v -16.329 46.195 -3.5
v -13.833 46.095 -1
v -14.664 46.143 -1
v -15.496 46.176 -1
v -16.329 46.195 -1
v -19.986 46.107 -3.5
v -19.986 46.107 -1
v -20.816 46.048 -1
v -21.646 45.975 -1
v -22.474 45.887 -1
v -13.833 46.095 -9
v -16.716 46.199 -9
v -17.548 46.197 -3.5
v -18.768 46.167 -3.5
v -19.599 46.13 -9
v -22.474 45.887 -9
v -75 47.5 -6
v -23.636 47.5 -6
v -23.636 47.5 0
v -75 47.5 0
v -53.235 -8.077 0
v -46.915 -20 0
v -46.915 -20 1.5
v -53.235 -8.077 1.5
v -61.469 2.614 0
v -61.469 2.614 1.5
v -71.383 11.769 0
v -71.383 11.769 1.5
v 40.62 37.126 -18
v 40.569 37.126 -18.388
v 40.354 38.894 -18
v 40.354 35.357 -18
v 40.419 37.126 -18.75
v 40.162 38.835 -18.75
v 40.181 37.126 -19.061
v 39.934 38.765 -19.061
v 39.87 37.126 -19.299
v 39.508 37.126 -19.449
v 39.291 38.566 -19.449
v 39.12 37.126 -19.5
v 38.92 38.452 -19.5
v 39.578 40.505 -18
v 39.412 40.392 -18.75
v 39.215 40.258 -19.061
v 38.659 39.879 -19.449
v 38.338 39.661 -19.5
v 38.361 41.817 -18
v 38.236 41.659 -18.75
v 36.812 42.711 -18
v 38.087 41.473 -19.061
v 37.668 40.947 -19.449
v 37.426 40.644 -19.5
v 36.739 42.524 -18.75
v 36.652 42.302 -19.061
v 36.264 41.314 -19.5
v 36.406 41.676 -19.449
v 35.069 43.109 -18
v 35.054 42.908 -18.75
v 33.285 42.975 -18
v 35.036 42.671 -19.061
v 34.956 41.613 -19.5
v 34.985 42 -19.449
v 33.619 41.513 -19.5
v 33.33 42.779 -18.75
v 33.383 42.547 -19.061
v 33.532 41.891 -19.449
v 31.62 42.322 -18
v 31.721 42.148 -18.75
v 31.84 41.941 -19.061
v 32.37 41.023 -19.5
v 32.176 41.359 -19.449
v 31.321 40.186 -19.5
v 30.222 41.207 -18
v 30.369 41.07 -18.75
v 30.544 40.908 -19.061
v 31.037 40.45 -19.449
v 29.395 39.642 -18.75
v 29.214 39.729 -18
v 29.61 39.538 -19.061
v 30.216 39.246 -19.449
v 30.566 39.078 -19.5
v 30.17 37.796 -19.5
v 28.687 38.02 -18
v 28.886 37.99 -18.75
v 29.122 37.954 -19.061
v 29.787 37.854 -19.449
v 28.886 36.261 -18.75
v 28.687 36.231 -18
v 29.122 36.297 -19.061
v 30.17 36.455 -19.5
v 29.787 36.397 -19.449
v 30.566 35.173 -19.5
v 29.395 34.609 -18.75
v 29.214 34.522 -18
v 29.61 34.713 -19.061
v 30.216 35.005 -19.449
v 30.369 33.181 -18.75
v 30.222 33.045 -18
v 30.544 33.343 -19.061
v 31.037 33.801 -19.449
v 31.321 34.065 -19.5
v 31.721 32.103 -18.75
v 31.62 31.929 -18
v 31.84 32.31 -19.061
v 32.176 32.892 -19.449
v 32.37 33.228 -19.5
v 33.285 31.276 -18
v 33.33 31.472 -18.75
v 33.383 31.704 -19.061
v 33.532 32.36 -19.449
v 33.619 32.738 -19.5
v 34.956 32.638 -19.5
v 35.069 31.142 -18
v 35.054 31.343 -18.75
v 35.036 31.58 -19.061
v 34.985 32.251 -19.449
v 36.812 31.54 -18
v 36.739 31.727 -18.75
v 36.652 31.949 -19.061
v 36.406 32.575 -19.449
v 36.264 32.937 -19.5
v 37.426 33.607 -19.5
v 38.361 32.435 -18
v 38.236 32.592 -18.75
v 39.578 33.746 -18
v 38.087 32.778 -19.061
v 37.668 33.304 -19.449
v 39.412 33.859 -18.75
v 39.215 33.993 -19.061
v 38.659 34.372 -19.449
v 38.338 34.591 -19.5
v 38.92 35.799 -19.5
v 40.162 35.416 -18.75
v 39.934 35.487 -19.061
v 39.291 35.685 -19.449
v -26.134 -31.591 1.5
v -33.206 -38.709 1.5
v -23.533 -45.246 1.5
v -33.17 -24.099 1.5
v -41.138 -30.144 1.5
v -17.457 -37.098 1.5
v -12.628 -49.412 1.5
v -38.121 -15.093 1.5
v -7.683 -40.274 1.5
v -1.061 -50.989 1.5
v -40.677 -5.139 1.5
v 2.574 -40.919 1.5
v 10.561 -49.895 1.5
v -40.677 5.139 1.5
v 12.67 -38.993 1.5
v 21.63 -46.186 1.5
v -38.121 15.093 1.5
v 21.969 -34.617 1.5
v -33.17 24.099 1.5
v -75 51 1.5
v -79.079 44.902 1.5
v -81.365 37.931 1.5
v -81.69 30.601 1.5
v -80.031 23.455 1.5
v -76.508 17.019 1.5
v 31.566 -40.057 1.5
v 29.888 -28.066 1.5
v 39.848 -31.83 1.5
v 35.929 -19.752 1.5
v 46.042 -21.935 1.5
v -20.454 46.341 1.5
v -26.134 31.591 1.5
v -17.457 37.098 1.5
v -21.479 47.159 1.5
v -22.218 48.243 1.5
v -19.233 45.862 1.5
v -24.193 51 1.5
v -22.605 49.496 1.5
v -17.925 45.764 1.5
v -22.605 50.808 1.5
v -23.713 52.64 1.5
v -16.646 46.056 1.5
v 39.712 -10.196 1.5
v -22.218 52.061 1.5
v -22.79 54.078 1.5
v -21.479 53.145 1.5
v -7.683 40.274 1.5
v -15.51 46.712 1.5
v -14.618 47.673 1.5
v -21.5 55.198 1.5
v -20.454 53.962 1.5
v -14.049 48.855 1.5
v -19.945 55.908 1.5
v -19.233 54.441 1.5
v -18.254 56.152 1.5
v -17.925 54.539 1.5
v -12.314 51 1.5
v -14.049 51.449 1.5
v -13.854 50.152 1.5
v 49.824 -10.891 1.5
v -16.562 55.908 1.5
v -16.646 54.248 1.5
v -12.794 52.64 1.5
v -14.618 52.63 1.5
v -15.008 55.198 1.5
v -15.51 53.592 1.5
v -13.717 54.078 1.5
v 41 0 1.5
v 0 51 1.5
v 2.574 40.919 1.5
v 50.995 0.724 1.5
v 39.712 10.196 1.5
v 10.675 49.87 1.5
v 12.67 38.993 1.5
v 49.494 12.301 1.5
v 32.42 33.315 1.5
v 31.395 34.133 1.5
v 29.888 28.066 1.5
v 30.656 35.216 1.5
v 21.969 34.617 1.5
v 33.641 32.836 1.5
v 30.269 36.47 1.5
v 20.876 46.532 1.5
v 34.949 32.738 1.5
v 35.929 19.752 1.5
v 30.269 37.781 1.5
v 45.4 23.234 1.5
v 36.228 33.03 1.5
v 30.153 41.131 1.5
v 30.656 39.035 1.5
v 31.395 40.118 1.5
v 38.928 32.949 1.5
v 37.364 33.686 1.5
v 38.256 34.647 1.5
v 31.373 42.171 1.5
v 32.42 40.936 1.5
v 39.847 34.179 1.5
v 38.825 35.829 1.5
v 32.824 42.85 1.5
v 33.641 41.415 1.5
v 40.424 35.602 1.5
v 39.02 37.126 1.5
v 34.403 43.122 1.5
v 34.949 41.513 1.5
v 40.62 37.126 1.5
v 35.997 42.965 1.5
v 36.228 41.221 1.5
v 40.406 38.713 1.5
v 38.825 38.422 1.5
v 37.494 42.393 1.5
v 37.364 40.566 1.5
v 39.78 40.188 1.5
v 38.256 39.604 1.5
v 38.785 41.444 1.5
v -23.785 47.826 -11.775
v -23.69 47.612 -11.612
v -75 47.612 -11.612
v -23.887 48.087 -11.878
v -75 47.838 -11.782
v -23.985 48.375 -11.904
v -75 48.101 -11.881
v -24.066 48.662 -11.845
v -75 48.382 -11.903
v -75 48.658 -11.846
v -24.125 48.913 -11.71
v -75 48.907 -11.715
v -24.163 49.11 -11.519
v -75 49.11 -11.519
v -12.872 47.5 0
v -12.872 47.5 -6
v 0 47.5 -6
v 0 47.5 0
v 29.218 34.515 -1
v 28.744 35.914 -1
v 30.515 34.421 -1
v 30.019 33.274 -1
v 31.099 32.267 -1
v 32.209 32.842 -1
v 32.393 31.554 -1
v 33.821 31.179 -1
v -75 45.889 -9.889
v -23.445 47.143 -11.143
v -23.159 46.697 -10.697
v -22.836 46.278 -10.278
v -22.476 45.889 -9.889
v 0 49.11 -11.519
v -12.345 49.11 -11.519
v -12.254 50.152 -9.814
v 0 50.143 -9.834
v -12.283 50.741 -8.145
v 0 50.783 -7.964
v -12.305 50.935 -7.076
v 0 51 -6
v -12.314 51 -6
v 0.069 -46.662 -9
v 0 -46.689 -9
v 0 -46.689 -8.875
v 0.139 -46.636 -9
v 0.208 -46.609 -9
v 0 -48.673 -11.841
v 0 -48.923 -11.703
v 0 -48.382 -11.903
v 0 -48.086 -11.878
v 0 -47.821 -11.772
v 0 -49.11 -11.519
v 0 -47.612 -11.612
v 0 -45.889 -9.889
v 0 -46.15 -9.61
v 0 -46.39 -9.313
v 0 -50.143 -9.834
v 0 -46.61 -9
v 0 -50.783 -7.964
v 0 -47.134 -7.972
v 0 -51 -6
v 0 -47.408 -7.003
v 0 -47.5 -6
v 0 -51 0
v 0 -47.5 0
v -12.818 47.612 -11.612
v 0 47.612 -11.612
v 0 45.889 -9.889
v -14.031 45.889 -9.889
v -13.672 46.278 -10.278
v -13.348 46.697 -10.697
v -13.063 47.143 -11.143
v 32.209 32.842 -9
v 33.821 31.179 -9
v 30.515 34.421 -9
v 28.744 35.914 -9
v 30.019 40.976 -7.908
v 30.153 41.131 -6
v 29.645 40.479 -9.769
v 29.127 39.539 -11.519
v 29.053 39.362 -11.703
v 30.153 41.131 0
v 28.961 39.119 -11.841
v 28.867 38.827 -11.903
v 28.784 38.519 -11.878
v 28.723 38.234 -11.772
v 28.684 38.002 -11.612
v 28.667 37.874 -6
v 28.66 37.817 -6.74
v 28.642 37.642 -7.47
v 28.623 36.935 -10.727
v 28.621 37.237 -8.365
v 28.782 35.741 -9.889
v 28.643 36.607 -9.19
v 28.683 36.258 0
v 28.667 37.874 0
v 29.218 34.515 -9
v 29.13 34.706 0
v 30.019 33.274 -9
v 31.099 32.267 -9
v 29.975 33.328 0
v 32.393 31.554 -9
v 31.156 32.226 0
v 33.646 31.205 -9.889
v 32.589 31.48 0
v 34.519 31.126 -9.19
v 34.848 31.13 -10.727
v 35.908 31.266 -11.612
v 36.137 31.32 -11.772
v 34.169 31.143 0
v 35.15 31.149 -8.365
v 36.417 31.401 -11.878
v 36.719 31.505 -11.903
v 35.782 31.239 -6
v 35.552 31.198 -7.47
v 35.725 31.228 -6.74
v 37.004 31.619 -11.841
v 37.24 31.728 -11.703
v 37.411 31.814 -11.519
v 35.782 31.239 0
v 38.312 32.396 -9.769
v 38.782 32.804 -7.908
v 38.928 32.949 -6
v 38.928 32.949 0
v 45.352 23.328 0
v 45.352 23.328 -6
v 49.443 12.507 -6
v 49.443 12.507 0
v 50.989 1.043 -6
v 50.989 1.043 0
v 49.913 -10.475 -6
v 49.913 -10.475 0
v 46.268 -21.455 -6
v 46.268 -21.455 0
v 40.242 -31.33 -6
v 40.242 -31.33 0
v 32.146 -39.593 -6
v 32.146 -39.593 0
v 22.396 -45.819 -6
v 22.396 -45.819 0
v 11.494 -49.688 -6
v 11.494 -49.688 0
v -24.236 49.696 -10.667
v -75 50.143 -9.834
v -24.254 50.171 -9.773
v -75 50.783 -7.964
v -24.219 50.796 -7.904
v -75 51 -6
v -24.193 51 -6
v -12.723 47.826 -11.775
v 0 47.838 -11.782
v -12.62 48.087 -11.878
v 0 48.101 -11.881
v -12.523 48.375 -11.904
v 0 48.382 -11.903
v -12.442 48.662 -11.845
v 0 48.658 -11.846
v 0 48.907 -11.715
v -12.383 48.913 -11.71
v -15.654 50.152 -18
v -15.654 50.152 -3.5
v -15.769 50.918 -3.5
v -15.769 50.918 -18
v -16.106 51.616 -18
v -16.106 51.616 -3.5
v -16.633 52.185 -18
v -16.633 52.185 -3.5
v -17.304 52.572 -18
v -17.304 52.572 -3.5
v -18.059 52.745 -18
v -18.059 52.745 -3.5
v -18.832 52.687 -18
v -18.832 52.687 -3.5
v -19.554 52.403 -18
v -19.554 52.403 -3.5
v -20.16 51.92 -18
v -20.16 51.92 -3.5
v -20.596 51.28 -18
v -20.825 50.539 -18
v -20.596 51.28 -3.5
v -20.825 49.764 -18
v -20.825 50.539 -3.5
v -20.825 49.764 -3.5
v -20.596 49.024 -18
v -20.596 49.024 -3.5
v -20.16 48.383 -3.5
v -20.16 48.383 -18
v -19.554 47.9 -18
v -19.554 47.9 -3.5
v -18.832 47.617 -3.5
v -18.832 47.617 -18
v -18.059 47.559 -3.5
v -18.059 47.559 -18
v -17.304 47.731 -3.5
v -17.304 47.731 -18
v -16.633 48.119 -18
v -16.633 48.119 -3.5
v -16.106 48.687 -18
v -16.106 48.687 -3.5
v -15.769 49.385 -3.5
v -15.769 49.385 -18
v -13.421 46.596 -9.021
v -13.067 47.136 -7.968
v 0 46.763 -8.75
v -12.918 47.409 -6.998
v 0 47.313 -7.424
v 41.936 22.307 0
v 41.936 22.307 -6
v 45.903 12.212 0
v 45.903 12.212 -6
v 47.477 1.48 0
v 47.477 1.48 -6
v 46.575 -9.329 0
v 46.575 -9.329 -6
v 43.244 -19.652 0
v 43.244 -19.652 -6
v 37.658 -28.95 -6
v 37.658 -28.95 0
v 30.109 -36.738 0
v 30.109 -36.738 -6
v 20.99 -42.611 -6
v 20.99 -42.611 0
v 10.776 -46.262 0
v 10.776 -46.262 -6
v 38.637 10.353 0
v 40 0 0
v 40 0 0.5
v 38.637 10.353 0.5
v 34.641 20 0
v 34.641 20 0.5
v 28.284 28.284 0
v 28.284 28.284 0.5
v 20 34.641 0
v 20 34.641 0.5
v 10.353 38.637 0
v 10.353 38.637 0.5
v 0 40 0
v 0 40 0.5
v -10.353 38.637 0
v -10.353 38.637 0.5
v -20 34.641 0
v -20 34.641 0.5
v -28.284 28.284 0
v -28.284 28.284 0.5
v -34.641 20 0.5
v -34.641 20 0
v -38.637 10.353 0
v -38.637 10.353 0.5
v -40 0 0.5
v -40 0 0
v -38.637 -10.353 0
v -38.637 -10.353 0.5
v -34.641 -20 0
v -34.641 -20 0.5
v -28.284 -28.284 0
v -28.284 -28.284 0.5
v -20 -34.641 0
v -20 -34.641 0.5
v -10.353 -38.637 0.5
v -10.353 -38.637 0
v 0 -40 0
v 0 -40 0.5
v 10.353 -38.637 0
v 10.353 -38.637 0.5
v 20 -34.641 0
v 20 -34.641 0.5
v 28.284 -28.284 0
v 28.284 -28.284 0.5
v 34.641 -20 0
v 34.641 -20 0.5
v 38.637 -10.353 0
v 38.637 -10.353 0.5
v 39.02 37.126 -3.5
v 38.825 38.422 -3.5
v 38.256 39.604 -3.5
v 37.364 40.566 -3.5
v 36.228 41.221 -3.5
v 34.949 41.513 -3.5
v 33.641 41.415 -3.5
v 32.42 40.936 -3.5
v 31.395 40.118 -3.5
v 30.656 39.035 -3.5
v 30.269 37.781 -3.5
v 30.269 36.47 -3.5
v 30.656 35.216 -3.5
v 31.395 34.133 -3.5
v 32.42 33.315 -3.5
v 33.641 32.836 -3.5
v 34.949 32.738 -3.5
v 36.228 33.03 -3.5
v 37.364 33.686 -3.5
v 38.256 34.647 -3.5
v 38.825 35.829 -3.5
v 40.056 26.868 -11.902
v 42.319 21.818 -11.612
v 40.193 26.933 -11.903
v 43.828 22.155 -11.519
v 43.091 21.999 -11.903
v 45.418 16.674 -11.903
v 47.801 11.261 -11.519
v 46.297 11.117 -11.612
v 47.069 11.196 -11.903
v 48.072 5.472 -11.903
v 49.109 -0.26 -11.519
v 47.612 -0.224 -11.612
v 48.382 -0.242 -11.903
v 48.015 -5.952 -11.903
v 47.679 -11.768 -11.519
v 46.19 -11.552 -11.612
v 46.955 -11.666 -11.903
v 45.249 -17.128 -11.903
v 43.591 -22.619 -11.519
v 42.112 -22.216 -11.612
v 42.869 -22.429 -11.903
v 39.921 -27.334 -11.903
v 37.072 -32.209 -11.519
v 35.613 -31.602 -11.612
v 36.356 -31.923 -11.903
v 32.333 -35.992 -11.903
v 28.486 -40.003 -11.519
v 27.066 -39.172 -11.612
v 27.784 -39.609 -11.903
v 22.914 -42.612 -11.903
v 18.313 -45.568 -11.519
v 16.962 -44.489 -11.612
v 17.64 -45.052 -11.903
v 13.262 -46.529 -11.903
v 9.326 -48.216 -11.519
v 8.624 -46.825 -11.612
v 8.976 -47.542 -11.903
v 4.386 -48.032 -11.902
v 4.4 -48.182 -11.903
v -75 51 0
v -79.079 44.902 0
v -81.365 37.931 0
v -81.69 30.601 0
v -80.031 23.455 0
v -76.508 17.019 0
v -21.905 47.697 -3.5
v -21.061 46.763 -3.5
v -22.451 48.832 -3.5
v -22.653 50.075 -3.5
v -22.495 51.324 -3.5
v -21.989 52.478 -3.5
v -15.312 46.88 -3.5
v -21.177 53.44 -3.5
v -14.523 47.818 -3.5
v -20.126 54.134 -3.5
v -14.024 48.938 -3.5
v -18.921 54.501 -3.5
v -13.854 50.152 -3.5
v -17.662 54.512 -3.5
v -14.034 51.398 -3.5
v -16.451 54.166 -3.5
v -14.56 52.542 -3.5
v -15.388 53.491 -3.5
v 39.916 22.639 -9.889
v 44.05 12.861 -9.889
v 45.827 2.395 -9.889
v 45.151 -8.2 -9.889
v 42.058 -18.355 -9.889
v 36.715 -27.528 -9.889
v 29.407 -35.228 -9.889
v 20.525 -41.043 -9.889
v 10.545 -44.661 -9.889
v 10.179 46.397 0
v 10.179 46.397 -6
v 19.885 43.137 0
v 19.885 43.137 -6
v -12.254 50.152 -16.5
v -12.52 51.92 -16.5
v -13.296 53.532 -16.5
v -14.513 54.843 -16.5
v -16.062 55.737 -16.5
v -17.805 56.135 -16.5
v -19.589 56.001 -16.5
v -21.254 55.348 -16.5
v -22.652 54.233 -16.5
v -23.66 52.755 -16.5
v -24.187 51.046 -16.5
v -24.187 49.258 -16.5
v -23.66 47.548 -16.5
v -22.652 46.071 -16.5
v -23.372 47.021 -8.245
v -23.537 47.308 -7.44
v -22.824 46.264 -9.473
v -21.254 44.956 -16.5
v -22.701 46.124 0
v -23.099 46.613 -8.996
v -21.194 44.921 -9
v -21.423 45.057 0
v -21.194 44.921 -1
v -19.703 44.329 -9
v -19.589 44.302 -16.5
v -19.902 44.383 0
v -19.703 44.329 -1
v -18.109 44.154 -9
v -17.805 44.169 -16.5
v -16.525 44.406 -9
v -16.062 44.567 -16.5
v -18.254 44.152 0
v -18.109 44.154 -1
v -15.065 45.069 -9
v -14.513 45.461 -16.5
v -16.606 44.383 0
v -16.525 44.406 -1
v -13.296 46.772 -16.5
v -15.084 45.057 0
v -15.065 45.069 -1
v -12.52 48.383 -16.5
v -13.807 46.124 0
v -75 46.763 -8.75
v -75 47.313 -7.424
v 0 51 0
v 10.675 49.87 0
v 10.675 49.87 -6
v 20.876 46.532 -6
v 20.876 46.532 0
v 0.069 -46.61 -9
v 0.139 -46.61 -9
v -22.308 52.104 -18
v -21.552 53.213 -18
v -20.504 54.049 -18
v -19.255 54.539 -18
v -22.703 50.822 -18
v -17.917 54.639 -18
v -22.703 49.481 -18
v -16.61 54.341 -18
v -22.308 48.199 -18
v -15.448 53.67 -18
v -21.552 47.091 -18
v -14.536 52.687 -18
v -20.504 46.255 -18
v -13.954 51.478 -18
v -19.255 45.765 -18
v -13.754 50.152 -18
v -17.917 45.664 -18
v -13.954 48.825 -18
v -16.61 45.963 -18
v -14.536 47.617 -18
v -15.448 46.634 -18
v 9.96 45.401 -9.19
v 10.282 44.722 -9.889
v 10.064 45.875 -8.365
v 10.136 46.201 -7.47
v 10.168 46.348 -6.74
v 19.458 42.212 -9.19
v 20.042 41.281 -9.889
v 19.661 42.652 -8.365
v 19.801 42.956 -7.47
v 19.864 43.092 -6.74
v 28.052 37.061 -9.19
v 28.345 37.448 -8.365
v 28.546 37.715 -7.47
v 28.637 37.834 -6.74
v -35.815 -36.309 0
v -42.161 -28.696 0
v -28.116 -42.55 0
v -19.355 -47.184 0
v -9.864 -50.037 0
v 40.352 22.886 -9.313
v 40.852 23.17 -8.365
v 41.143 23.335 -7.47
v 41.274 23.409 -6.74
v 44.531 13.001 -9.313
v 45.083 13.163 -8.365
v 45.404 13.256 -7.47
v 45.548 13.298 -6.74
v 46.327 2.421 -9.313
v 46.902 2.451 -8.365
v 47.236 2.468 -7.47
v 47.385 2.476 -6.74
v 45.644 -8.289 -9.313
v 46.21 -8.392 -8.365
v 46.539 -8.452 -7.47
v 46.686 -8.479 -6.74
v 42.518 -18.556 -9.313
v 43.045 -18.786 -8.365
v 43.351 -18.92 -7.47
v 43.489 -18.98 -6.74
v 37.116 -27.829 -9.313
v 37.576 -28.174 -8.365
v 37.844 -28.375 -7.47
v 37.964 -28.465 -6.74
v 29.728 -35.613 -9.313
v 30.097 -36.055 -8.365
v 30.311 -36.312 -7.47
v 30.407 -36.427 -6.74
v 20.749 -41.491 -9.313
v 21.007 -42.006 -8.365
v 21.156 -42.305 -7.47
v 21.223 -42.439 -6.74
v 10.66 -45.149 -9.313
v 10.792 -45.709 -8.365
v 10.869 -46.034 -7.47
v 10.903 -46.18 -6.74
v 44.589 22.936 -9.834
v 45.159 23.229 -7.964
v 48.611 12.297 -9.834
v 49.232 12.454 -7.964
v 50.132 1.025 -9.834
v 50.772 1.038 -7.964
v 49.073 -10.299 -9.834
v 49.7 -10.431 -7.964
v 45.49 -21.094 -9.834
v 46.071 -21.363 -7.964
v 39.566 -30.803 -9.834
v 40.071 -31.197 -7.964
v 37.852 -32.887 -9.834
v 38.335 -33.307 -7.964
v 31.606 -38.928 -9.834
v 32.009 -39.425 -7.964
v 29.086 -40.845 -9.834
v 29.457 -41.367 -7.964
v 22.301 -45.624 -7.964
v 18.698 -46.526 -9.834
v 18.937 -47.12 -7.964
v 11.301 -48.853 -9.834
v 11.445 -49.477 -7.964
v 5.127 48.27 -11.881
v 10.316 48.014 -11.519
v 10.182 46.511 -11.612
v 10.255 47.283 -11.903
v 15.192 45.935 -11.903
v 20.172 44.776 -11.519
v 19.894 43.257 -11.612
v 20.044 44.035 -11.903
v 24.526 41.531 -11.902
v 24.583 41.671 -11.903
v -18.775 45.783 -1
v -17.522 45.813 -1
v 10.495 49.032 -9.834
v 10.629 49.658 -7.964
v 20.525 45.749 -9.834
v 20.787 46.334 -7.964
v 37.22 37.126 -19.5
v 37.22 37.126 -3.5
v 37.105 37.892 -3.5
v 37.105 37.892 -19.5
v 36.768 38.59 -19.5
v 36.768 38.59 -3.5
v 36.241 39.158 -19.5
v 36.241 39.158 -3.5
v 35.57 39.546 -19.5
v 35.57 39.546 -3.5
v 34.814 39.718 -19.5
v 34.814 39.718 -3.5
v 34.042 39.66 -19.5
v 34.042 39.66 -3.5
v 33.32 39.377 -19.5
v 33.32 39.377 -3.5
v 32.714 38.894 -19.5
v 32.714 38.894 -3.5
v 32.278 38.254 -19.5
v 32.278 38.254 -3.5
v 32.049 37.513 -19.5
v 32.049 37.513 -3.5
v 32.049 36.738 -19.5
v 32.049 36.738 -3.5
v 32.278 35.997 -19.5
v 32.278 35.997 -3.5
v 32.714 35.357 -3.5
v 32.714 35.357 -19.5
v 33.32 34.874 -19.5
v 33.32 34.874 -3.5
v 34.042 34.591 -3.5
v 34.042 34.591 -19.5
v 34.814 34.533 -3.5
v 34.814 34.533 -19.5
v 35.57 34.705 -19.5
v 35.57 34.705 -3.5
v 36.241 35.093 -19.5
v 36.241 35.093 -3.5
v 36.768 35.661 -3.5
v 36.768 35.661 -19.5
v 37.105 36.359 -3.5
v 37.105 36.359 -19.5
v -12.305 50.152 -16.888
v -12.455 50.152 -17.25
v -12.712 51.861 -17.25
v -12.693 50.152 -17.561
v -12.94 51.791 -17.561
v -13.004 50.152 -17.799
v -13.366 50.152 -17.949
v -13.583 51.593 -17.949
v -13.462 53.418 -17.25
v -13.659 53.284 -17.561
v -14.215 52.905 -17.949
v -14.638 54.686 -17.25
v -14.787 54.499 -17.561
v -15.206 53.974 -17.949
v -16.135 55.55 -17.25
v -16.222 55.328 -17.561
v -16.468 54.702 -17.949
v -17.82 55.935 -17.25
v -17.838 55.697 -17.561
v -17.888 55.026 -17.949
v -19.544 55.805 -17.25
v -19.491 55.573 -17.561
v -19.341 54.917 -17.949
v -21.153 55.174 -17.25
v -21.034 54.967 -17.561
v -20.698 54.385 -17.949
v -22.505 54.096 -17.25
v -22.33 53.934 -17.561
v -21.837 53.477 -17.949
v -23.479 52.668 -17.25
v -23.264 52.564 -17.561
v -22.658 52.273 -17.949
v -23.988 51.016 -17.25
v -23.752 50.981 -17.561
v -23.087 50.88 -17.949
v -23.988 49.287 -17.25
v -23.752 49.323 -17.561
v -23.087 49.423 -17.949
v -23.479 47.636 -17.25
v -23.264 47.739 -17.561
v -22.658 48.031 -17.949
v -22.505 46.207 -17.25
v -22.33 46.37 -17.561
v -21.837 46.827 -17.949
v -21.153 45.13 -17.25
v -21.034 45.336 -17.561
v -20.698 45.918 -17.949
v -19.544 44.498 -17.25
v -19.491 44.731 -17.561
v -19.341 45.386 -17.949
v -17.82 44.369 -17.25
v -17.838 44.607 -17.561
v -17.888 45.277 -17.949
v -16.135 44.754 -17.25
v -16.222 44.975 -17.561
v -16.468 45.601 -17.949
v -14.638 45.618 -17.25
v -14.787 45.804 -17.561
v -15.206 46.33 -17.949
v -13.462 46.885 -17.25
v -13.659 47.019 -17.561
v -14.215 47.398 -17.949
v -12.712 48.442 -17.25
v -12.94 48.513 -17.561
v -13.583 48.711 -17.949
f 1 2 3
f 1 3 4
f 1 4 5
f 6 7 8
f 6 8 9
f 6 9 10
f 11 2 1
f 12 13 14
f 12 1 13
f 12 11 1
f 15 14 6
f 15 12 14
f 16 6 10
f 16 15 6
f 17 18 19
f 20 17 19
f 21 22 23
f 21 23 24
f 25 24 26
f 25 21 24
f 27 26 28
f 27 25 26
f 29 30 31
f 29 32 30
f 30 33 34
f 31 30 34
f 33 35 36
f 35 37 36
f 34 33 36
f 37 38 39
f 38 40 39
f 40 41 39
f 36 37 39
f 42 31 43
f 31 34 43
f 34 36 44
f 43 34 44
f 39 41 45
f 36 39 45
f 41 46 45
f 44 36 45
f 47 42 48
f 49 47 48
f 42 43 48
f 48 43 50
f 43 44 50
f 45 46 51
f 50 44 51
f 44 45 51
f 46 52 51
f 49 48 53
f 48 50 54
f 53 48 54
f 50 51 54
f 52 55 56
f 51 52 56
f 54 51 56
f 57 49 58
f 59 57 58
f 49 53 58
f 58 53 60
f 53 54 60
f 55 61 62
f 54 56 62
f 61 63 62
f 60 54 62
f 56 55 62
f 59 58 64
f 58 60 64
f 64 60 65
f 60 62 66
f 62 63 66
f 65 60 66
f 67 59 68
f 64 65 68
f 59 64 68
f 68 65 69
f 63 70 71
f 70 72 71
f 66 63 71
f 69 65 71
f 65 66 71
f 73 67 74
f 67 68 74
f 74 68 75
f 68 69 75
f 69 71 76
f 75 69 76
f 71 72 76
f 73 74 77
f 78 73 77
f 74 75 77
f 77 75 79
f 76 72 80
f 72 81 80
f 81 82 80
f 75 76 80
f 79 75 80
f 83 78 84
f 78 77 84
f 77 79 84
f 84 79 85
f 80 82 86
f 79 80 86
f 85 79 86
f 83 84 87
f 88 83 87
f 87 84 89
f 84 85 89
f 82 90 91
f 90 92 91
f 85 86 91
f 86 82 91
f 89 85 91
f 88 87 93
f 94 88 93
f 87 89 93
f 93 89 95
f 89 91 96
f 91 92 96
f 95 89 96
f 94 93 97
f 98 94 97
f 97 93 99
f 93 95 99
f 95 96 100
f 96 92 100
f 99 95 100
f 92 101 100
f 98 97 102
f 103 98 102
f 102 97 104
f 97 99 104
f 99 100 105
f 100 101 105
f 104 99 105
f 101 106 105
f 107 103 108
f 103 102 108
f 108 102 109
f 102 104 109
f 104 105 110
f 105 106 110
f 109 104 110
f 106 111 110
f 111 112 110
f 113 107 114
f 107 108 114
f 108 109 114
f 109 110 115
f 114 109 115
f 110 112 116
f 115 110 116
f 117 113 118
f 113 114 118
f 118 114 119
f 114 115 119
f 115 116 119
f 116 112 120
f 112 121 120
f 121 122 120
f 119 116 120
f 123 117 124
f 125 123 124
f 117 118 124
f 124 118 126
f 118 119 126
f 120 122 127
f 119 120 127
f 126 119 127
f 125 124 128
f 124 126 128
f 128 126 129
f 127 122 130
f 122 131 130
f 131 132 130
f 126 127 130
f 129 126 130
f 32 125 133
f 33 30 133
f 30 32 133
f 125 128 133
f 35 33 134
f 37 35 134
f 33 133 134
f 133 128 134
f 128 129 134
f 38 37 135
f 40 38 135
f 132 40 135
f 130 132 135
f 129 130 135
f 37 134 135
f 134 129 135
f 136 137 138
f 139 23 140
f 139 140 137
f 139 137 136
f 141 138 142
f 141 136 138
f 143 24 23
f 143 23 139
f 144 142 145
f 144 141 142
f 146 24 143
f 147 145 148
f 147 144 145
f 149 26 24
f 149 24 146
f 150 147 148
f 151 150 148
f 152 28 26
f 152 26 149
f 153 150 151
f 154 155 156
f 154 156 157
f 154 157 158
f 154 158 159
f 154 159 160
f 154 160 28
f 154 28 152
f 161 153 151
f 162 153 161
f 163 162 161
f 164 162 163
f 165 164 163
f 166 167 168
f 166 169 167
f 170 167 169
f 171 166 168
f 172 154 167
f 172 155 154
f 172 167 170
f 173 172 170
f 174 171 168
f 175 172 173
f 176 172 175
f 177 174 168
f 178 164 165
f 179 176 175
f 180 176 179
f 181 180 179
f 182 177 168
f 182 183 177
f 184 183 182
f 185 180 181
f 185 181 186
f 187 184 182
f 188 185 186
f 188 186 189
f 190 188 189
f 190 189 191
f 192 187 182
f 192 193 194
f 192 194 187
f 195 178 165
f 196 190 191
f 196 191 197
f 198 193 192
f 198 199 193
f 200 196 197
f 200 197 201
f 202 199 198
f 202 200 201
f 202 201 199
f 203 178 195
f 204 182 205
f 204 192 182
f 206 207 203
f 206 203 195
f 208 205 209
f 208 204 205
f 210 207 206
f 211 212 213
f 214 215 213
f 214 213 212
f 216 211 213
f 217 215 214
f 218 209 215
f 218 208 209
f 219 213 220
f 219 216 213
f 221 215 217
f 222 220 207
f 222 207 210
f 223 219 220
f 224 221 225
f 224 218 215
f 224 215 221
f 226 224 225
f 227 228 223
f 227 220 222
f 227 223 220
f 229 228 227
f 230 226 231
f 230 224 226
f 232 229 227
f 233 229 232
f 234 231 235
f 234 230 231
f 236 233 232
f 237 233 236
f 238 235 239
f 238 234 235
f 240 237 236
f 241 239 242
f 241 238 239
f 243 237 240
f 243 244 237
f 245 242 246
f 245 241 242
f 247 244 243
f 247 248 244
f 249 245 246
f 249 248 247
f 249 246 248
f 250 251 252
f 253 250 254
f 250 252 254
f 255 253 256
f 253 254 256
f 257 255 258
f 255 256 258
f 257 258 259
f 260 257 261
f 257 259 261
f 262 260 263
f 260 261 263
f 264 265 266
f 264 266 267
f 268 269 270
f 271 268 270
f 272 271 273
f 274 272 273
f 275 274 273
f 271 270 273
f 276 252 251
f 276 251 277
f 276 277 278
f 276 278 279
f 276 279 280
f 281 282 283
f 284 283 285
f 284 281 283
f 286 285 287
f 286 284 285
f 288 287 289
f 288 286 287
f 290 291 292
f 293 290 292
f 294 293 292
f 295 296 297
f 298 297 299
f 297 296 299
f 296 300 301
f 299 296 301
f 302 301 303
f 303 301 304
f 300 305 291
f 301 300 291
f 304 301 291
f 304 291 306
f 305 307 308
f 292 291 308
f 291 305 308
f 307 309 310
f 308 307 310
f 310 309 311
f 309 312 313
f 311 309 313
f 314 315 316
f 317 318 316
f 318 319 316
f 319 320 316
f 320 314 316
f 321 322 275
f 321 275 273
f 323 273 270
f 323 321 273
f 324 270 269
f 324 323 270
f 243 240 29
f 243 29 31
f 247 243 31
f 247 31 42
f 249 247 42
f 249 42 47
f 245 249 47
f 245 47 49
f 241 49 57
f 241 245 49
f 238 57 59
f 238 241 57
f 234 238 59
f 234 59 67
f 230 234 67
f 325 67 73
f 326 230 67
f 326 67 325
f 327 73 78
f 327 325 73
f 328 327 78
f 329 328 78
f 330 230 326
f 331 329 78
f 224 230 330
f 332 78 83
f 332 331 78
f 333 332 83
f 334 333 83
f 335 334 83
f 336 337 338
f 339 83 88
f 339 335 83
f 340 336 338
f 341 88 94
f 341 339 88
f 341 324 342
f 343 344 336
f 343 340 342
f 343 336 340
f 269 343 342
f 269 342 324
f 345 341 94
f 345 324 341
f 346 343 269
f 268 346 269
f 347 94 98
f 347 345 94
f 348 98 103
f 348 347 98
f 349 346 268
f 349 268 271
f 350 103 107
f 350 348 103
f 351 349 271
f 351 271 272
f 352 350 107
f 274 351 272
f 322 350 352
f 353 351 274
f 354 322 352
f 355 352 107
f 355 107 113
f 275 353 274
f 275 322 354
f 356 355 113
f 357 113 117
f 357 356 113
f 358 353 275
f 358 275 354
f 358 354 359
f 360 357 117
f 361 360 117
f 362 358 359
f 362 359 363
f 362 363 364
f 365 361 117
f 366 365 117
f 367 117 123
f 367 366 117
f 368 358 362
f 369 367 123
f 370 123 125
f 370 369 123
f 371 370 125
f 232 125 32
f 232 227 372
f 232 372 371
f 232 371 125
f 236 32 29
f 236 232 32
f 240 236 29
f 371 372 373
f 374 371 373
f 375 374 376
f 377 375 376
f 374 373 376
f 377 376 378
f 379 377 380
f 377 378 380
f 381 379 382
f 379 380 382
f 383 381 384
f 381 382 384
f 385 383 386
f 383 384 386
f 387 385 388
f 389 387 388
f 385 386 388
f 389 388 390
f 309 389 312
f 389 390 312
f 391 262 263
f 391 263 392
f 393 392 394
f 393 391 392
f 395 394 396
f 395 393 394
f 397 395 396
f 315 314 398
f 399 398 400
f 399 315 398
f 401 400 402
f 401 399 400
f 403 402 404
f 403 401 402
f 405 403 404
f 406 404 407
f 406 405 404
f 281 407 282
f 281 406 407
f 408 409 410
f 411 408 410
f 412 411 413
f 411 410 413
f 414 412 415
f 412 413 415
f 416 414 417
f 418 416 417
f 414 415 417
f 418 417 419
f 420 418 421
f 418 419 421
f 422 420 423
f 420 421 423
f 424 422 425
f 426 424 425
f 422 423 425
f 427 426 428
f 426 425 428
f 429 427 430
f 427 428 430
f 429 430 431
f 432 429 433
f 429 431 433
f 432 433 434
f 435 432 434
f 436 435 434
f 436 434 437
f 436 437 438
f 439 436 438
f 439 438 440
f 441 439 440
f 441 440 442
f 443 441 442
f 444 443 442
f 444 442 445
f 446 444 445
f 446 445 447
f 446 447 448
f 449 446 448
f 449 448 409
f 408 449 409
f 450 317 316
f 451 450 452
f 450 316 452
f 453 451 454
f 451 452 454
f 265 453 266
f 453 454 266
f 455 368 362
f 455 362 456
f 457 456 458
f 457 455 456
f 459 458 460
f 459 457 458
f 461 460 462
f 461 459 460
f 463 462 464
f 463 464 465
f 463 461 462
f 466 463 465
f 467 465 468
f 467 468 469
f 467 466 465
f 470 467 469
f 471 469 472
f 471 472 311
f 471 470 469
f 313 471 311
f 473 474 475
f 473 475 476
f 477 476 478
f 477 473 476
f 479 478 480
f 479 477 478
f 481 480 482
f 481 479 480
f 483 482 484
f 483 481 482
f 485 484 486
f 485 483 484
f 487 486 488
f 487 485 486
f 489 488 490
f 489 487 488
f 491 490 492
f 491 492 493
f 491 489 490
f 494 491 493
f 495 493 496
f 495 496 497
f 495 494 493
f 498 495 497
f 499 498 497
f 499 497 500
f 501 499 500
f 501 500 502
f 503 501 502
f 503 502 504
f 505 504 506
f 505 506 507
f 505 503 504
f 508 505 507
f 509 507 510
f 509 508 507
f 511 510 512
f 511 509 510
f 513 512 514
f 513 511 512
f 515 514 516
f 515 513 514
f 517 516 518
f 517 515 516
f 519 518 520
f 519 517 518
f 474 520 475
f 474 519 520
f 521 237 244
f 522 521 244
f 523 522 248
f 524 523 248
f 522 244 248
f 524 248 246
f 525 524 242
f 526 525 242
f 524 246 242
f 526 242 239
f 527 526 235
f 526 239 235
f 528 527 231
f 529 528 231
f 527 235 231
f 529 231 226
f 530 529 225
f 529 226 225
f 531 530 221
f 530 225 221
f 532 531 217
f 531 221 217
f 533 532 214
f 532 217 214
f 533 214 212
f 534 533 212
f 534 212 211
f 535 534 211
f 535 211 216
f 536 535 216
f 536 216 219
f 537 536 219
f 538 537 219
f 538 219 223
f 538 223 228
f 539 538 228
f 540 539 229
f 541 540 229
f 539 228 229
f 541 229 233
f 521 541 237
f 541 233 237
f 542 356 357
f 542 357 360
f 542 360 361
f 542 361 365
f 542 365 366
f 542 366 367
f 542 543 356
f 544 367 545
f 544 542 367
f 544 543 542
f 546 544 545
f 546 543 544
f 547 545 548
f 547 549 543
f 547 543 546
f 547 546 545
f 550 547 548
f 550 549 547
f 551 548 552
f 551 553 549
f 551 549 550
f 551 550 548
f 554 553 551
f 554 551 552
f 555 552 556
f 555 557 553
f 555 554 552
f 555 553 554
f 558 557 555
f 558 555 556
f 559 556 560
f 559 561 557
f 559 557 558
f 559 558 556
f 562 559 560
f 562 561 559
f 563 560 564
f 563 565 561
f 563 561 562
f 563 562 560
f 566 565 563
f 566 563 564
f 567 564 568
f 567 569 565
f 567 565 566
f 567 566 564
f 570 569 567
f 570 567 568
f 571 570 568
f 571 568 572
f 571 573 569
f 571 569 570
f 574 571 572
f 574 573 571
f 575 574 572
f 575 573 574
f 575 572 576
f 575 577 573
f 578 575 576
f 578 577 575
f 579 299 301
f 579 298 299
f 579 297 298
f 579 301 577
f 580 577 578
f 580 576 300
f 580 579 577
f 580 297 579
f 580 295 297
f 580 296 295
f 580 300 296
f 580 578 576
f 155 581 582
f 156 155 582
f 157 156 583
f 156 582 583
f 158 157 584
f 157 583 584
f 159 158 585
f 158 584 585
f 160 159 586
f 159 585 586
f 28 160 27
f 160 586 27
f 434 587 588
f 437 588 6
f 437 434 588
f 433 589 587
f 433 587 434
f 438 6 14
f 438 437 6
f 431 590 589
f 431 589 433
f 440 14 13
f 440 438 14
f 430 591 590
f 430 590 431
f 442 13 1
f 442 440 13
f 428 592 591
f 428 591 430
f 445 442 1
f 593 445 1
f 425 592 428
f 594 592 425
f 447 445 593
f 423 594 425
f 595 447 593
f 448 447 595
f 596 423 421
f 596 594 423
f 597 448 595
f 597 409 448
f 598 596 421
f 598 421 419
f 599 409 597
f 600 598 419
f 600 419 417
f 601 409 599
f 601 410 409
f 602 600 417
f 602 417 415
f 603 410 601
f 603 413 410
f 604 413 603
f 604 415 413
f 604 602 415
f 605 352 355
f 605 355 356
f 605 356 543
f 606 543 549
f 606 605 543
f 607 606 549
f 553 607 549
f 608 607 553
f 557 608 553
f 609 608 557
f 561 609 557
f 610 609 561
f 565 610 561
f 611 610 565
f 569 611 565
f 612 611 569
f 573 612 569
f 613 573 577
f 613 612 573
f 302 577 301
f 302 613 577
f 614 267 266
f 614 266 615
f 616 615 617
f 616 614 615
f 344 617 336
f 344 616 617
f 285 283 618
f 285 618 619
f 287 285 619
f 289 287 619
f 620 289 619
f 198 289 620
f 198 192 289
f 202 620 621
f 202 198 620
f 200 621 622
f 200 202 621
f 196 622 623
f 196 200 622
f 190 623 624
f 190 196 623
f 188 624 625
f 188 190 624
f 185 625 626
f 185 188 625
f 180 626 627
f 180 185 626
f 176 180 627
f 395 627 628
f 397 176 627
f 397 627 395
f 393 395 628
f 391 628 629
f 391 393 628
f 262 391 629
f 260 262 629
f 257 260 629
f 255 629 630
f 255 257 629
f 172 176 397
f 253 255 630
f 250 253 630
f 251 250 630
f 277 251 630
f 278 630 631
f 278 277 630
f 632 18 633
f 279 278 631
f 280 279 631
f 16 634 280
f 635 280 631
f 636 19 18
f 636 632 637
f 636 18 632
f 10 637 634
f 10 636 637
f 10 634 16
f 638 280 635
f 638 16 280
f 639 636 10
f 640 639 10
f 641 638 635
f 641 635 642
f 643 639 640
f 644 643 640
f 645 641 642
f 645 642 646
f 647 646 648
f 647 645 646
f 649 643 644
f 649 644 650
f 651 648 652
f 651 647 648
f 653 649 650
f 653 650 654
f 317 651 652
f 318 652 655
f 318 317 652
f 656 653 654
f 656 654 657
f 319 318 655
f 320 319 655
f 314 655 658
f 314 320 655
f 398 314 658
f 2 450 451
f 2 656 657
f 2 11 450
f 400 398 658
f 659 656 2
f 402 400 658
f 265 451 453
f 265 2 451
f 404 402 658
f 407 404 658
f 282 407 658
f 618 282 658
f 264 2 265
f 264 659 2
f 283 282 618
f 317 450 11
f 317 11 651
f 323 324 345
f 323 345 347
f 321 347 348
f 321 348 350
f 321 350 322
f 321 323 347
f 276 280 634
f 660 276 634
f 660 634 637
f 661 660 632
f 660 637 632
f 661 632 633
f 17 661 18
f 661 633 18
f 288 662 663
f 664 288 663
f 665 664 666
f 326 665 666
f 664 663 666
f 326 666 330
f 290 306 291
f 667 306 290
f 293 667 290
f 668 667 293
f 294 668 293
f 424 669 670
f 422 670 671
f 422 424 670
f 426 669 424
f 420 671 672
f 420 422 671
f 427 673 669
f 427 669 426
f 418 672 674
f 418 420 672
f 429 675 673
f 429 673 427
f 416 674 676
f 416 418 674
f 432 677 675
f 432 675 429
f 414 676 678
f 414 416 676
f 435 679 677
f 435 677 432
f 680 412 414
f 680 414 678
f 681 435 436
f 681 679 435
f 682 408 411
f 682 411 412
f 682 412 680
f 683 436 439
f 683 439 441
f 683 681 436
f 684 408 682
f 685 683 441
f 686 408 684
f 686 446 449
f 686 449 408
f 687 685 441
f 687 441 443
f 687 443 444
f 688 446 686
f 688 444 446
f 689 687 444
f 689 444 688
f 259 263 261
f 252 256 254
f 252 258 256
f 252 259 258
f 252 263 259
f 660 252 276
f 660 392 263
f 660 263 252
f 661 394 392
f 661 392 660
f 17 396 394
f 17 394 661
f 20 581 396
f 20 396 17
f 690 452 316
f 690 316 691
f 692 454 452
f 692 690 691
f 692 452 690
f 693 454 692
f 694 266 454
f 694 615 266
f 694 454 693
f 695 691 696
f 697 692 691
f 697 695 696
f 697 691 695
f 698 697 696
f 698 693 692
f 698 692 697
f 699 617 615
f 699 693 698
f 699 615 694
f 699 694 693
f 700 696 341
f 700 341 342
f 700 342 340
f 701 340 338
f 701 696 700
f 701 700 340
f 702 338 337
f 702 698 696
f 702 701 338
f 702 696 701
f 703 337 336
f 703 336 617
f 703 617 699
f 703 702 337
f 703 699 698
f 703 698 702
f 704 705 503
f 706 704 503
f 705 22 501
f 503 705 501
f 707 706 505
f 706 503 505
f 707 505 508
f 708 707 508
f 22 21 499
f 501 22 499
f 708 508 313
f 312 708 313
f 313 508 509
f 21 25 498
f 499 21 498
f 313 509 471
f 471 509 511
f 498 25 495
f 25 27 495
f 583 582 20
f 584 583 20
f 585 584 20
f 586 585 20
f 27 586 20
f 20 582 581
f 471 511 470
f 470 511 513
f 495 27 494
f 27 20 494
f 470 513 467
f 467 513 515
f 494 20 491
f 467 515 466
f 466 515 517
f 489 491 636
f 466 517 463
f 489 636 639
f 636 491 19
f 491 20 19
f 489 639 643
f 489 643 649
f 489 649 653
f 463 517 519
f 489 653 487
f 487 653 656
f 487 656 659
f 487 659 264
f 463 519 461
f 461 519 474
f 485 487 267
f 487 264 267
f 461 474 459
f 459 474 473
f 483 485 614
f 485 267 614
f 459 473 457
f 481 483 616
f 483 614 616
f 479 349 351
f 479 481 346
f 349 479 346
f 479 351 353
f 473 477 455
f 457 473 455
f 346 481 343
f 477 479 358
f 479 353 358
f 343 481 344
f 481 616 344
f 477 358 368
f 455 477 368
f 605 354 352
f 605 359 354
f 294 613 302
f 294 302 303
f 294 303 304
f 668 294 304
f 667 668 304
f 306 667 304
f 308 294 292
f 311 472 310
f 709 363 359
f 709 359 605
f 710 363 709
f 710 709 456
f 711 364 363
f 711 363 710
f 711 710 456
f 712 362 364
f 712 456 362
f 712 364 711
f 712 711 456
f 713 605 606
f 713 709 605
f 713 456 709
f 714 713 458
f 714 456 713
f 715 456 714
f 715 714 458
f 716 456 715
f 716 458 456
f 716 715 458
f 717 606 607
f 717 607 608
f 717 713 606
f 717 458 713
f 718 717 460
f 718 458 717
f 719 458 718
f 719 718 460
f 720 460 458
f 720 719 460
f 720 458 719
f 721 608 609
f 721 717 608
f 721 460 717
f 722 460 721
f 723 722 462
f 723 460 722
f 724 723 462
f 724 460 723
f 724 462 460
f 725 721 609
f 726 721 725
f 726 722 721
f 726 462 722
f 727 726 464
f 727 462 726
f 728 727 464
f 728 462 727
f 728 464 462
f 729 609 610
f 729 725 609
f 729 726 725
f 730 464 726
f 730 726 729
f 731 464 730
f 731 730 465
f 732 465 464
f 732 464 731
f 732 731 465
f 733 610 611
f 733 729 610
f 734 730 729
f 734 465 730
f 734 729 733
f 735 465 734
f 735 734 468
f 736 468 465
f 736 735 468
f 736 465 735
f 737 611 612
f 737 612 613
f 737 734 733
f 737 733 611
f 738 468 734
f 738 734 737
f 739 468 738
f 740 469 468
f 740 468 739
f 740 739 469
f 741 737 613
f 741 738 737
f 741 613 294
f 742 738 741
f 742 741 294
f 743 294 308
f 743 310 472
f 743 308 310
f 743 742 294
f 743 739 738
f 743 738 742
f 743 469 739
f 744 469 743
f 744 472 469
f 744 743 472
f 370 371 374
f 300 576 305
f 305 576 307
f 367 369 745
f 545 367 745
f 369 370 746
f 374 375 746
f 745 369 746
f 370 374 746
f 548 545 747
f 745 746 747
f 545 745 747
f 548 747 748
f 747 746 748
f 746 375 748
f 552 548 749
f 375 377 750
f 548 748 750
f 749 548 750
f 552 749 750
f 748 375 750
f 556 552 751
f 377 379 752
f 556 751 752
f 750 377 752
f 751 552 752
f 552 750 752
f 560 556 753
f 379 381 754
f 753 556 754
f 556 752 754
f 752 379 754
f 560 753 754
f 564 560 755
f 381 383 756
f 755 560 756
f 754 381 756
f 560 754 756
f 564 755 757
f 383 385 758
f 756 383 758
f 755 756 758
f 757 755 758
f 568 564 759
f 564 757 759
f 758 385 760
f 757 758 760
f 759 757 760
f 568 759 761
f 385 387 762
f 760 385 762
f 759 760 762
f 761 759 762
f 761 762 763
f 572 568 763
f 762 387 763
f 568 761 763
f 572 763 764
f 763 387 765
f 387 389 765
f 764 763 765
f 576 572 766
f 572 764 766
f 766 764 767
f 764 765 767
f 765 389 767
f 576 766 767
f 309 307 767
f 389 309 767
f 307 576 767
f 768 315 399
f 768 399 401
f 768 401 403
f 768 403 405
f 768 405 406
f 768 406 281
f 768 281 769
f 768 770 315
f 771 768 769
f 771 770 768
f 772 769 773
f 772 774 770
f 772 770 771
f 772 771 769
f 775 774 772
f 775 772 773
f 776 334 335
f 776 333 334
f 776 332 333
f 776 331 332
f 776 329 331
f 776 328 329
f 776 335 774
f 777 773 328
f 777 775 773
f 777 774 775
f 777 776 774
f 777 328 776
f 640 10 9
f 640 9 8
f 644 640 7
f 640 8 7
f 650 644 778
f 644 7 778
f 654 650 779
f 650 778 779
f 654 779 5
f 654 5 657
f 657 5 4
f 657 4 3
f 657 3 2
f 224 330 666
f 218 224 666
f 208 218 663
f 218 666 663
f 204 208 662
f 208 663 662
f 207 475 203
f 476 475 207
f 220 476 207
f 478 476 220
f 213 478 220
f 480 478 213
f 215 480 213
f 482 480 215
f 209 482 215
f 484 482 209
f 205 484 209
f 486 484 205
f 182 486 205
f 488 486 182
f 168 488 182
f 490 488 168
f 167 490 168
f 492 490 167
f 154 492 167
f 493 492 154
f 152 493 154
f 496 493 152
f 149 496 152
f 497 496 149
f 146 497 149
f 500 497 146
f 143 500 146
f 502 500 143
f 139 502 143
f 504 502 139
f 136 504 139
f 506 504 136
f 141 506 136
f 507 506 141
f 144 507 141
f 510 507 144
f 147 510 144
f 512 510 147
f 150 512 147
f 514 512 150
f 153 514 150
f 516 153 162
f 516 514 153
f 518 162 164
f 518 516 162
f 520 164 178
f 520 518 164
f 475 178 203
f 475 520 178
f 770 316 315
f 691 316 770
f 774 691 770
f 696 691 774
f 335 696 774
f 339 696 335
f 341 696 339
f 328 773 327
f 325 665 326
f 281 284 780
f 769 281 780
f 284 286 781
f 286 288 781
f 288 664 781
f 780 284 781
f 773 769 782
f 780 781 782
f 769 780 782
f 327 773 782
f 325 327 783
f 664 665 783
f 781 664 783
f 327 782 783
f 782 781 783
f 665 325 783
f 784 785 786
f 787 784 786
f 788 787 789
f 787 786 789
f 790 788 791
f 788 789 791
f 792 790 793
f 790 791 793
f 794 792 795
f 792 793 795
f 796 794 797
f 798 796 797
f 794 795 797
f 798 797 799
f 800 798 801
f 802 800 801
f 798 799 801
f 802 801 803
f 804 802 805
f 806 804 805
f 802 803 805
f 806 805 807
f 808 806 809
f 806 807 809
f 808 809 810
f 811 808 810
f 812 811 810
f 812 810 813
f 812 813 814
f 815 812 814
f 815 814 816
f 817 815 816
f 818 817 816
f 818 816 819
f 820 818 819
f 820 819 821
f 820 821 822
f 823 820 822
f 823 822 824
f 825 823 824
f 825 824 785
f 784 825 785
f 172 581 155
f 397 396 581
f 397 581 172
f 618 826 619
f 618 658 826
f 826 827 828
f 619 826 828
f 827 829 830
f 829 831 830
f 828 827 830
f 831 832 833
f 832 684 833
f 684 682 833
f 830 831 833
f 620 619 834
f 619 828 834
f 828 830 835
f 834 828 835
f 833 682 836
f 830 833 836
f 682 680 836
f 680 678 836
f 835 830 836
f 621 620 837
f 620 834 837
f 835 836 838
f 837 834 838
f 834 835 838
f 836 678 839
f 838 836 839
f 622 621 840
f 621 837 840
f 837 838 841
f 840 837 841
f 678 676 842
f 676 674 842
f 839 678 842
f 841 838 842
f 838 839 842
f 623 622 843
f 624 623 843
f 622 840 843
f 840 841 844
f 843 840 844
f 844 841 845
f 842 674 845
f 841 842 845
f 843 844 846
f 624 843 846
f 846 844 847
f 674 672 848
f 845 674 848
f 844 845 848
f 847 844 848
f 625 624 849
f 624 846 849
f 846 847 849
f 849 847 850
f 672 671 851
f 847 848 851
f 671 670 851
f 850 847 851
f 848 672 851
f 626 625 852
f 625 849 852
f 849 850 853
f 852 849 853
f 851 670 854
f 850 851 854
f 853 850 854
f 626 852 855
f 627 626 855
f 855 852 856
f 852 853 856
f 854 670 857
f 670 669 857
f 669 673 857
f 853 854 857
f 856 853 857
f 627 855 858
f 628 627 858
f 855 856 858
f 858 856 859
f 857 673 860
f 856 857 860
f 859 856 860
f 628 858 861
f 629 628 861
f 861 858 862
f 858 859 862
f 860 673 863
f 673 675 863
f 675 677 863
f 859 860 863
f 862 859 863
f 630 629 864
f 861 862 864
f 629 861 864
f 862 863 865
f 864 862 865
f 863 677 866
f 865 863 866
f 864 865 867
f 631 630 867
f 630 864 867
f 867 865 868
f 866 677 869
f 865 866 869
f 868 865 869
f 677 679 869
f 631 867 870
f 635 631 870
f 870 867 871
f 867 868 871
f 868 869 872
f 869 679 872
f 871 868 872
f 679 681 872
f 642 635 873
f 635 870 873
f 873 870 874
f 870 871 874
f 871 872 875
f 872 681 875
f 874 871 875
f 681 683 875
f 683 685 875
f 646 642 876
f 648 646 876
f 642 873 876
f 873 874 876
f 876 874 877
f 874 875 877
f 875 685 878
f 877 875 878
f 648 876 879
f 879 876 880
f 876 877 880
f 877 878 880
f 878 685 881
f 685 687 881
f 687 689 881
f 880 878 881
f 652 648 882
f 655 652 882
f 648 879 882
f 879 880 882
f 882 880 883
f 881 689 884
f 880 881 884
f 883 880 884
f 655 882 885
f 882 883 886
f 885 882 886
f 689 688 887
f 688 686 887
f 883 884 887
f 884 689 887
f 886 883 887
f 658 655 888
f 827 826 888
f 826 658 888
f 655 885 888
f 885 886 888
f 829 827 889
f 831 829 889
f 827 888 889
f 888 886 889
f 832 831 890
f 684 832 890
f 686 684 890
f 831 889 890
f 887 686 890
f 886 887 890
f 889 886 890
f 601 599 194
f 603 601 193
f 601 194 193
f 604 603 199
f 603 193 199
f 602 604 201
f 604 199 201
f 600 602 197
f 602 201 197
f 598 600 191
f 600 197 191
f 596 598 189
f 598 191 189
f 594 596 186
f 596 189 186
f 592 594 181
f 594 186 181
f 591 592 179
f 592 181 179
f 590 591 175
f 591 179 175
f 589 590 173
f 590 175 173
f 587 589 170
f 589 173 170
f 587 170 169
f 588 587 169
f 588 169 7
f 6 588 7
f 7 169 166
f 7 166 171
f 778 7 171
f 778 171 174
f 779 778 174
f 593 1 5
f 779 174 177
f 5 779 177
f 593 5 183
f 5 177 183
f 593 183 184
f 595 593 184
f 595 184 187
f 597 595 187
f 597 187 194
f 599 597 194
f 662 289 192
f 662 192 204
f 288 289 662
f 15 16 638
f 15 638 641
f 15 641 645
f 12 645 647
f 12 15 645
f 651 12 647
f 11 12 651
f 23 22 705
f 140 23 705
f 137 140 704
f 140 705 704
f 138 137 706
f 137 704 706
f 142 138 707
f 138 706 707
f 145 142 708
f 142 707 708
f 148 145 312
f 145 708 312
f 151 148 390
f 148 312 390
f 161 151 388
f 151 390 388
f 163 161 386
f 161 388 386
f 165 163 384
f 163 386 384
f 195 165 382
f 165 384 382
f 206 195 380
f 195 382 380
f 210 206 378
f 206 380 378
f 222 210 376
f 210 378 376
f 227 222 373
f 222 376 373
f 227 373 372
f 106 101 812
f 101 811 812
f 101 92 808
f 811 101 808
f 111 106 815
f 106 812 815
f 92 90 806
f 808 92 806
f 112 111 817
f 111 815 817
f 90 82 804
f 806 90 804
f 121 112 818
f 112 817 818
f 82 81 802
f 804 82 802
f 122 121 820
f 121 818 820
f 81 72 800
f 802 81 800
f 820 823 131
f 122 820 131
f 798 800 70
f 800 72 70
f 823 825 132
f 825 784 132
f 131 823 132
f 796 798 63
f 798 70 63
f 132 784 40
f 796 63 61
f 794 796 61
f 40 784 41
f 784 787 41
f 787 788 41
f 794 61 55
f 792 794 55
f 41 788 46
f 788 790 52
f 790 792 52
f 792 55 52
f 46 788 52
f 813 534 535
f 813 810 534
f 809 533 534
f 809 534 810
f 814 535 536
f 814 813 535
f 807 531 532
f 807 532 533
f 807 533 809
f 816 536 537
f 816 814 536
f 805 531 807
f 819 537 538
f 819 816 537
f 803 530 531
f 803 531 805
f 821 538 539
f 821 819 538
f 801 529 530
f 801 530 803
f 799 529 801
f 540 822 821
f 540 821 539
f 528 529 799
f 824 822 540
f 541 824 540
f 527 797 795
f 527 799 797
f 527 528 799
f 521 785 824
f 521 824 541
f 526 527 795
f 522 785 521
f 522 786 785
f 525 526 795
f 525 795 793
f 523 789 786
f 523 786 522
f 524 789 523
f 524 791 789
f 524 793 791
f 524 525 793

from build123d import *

# Parameters (mm, degrees)
CYLINDER004_R     = 48
CYLINDER004_DEPTH = 8
CYLINDER_R        = 46
CYLINDER_DEPTH    = 8
REVOLUTION_ANGLE  = -180
SKETCH_R          = 40
PAD_DEPTH         = 1.5
PAD001_DEPTH      = 75
SKETCH005_R       = 6
PAD002_DEPTH      = 21
SKETCH012_R       = 2.6
POCKET_DEPTH      = 21.001
SKETCH013_R       = 4.4
POCKET001_DEPTH   = 5
SKETCH008_W       = 35.7258
SKETCH008_H       = 35.7258
POCKET002_DEPTH   = 1.5
CHAMFER_SIZE      = 1
FILLET_R          = 1
FILLET001_R       = 1
FILLET002_R       = 1
FILLET003_R       = 1.5


with BuildPart() as cylinder004:
    # Cylinder004 → Cylinder004 (new body)
    with BuildSketch(Plane(origin=(-17, -1.8, -9), x_dir=(1, 0, 0), z_dir=(0, 0, 1))):
        Circle(CYLINDER004_R)
    extrude(amount=CYLINDER004_DEPTH)


with BuildPart() as cylinder:
    # Cylinder → Cylinder (new body)
    with BuildSketch(Plane.XY.offset(-9)):
        Circle(CYLINDER_R)
    extrude(amount=CYLINDER_DEPTH)


with BuildPart() as revolution:
    # Sketch004 → Revolution (revolve)
    with BuildSketch(Plane.YZ):
        with BuildLine():
            Line((48.363961, -12.363961), (45.889087, -9.889088))
            ThreePointArc((45.889087, -9.889088), (47.081337, -8.104759), (47.5, -6))
            Line((47.5, -6), (47.5, 0))
            Line((47.5, 0), (51, 0))
            Line((51, -6), (51, 0))
            ThreePointArc((48.363961, -12.363961), (50.314916, -9.444151), (51, -6))
        make_face()
    revolve(axis=Axis((0, 0, 0), (0, 0, 1)), revolution_arc=REVOLUTION_ANGLE)


with BuildPart() as pad:
    # Sketch → Pad (new body)
    with BuildSketch(Plane.XY):
        with BuildLine():
            ThreePointArc((-46.914816, -20), (42.549971, -28.115832), (0, 51))
            Line((-75, 51), (0, 51))
            ThreePointArc((-75, 51), (-81.690324, 30.60121), (-71.383422, 11.769352))
            ThreePointArc((-46.914816, -20), (-57.126294, -2.557354), (-71.383422, 11.769352))
        make_face()
        Circle(SKETCH_R, mode=Mode.SUBTRACT)
    extrude(amount=PAD_DEPTH)


with BuildPart() as fillet003:
    # Sketch009 → Pad001 (new body)
    with BuildSketch(Plane.YZ):
        with BuildLine():
            Line((48.363961, -12.363961), (45.889087, -9.889088))
            ThreePointArc((45.889087, -9.889088), (47.081337, -8.104759), (47.5, -6))
            Line((47.5, -6), (47.5, 0))
            Line((47.5, 0), (51, 0))
            Line((51, -6), (51, 0))
            ThreePointArc((48.363961, -12.363961), (50.314916, -9.444151), (51, -6))
        make_face()
    extrude(amount=-PAD001_DEPTH)

    # Fusion: union Revolution, Pad
    add(revolution.part)
    add(pad.part)

    # Sketch005 → Pad002 (new body)
    with BuildSketch(Plane.XY.offset(1.5)):
        with Locations((-18.253752, 50.151771)):
            Circle(SKETCH005_R)
        with Locations((34.620146, 37.125562)):
            Circle(SKETCH005_R)
    extrude(amount=-PAD002_DEPTH)

    # Sketch012 → Pocket (cut, through all)
    with BuildSketch(Plane.XY.offset(1.5)):
        with Locations((-18.253752, 50.151771)):
            Circle(SKETCH012_R)
        with Locations((34.620146, 37.125562)):
            Circle(SKETCH012_R)
    extrude(amount=-POCKET_DEPTH, mode=Mode.SUBTRACT)

    # Sketch013 → Pocket001 (cut)
    with BuildSketch(Plane.XY.offset(1.5)):
        with Locations((-18.253752, 50.151771)):
            Circle(SKETCH013_R)
        with Locations((34.620146, 37.125562)):
            Circle(SKETCH013_R)
    extrude(amount=-POCKET001_DEPTH, mode=Mode.SUBTRACT)

    # Sketch008 → Pocket002 (cut)
    with BuildSketch(Plane(origin=(0, 0, -19.5), x_dir=(1, 0, 0), z_dir=(0, 0, -1))):
        with Locations((-17.8629, -50.7062)):
            Rectangle(SKETCH008_W, SKETCH008_H)
    extrude(amount=-POCKET002_DEPTH, mode=Mode.SUBTRACT)

    # Cut: cut Cylinder
    add(cylinder.part, mode=Mode.SUBTRACT)

    # Cut001: cut Cylinder004
    add(cylinder004.part, mode=Mode.SUBTRACT)

    # Chamfer
    chamfer_edges = [fillet003.edges().sort_by_distance(p)[0] for p in [
        (-40, 0, 1.5),
    ]]
    chamfer(chamfer_edges, length=CHAMFER_SIZE)

    # Fillet
    fillet_edges = [fillet003.edges().sort_by_distance(p)[0] for p in [
        (43.945626, -20.195412, -12.363961),
    ]]
    fillet(fillet_edges, radius=FILLET_R)

    # Fillet001
    fillet001_edges = [fillet003.edges().sort_by_distance(p)[0] for p in [
        (15.200855, 45.913034, -12.363961),
    ]]
    fillet(fillet001_edges, radius=FILLET001_R)

    # Fillet002
    fillet002_edges = [fillet003.edges().sort_by_distance(p)[0] for p in [
        (-49.490603, 48.363961, -12.363961),
    ]]
    fillet(fillet002_edges, radius=FILLET002_R)

    # Fillet003
    fillet003_edges = [fillet003.edges().sort_by_distance(p)[0] for p in [
        (-24.253752, 50.151771, -18),
        (28.620146, 37.125562, -19.5),
    ]]
    fillet(fillet003_edges, radius=FILLET003_R)


solid = fillet003.part
